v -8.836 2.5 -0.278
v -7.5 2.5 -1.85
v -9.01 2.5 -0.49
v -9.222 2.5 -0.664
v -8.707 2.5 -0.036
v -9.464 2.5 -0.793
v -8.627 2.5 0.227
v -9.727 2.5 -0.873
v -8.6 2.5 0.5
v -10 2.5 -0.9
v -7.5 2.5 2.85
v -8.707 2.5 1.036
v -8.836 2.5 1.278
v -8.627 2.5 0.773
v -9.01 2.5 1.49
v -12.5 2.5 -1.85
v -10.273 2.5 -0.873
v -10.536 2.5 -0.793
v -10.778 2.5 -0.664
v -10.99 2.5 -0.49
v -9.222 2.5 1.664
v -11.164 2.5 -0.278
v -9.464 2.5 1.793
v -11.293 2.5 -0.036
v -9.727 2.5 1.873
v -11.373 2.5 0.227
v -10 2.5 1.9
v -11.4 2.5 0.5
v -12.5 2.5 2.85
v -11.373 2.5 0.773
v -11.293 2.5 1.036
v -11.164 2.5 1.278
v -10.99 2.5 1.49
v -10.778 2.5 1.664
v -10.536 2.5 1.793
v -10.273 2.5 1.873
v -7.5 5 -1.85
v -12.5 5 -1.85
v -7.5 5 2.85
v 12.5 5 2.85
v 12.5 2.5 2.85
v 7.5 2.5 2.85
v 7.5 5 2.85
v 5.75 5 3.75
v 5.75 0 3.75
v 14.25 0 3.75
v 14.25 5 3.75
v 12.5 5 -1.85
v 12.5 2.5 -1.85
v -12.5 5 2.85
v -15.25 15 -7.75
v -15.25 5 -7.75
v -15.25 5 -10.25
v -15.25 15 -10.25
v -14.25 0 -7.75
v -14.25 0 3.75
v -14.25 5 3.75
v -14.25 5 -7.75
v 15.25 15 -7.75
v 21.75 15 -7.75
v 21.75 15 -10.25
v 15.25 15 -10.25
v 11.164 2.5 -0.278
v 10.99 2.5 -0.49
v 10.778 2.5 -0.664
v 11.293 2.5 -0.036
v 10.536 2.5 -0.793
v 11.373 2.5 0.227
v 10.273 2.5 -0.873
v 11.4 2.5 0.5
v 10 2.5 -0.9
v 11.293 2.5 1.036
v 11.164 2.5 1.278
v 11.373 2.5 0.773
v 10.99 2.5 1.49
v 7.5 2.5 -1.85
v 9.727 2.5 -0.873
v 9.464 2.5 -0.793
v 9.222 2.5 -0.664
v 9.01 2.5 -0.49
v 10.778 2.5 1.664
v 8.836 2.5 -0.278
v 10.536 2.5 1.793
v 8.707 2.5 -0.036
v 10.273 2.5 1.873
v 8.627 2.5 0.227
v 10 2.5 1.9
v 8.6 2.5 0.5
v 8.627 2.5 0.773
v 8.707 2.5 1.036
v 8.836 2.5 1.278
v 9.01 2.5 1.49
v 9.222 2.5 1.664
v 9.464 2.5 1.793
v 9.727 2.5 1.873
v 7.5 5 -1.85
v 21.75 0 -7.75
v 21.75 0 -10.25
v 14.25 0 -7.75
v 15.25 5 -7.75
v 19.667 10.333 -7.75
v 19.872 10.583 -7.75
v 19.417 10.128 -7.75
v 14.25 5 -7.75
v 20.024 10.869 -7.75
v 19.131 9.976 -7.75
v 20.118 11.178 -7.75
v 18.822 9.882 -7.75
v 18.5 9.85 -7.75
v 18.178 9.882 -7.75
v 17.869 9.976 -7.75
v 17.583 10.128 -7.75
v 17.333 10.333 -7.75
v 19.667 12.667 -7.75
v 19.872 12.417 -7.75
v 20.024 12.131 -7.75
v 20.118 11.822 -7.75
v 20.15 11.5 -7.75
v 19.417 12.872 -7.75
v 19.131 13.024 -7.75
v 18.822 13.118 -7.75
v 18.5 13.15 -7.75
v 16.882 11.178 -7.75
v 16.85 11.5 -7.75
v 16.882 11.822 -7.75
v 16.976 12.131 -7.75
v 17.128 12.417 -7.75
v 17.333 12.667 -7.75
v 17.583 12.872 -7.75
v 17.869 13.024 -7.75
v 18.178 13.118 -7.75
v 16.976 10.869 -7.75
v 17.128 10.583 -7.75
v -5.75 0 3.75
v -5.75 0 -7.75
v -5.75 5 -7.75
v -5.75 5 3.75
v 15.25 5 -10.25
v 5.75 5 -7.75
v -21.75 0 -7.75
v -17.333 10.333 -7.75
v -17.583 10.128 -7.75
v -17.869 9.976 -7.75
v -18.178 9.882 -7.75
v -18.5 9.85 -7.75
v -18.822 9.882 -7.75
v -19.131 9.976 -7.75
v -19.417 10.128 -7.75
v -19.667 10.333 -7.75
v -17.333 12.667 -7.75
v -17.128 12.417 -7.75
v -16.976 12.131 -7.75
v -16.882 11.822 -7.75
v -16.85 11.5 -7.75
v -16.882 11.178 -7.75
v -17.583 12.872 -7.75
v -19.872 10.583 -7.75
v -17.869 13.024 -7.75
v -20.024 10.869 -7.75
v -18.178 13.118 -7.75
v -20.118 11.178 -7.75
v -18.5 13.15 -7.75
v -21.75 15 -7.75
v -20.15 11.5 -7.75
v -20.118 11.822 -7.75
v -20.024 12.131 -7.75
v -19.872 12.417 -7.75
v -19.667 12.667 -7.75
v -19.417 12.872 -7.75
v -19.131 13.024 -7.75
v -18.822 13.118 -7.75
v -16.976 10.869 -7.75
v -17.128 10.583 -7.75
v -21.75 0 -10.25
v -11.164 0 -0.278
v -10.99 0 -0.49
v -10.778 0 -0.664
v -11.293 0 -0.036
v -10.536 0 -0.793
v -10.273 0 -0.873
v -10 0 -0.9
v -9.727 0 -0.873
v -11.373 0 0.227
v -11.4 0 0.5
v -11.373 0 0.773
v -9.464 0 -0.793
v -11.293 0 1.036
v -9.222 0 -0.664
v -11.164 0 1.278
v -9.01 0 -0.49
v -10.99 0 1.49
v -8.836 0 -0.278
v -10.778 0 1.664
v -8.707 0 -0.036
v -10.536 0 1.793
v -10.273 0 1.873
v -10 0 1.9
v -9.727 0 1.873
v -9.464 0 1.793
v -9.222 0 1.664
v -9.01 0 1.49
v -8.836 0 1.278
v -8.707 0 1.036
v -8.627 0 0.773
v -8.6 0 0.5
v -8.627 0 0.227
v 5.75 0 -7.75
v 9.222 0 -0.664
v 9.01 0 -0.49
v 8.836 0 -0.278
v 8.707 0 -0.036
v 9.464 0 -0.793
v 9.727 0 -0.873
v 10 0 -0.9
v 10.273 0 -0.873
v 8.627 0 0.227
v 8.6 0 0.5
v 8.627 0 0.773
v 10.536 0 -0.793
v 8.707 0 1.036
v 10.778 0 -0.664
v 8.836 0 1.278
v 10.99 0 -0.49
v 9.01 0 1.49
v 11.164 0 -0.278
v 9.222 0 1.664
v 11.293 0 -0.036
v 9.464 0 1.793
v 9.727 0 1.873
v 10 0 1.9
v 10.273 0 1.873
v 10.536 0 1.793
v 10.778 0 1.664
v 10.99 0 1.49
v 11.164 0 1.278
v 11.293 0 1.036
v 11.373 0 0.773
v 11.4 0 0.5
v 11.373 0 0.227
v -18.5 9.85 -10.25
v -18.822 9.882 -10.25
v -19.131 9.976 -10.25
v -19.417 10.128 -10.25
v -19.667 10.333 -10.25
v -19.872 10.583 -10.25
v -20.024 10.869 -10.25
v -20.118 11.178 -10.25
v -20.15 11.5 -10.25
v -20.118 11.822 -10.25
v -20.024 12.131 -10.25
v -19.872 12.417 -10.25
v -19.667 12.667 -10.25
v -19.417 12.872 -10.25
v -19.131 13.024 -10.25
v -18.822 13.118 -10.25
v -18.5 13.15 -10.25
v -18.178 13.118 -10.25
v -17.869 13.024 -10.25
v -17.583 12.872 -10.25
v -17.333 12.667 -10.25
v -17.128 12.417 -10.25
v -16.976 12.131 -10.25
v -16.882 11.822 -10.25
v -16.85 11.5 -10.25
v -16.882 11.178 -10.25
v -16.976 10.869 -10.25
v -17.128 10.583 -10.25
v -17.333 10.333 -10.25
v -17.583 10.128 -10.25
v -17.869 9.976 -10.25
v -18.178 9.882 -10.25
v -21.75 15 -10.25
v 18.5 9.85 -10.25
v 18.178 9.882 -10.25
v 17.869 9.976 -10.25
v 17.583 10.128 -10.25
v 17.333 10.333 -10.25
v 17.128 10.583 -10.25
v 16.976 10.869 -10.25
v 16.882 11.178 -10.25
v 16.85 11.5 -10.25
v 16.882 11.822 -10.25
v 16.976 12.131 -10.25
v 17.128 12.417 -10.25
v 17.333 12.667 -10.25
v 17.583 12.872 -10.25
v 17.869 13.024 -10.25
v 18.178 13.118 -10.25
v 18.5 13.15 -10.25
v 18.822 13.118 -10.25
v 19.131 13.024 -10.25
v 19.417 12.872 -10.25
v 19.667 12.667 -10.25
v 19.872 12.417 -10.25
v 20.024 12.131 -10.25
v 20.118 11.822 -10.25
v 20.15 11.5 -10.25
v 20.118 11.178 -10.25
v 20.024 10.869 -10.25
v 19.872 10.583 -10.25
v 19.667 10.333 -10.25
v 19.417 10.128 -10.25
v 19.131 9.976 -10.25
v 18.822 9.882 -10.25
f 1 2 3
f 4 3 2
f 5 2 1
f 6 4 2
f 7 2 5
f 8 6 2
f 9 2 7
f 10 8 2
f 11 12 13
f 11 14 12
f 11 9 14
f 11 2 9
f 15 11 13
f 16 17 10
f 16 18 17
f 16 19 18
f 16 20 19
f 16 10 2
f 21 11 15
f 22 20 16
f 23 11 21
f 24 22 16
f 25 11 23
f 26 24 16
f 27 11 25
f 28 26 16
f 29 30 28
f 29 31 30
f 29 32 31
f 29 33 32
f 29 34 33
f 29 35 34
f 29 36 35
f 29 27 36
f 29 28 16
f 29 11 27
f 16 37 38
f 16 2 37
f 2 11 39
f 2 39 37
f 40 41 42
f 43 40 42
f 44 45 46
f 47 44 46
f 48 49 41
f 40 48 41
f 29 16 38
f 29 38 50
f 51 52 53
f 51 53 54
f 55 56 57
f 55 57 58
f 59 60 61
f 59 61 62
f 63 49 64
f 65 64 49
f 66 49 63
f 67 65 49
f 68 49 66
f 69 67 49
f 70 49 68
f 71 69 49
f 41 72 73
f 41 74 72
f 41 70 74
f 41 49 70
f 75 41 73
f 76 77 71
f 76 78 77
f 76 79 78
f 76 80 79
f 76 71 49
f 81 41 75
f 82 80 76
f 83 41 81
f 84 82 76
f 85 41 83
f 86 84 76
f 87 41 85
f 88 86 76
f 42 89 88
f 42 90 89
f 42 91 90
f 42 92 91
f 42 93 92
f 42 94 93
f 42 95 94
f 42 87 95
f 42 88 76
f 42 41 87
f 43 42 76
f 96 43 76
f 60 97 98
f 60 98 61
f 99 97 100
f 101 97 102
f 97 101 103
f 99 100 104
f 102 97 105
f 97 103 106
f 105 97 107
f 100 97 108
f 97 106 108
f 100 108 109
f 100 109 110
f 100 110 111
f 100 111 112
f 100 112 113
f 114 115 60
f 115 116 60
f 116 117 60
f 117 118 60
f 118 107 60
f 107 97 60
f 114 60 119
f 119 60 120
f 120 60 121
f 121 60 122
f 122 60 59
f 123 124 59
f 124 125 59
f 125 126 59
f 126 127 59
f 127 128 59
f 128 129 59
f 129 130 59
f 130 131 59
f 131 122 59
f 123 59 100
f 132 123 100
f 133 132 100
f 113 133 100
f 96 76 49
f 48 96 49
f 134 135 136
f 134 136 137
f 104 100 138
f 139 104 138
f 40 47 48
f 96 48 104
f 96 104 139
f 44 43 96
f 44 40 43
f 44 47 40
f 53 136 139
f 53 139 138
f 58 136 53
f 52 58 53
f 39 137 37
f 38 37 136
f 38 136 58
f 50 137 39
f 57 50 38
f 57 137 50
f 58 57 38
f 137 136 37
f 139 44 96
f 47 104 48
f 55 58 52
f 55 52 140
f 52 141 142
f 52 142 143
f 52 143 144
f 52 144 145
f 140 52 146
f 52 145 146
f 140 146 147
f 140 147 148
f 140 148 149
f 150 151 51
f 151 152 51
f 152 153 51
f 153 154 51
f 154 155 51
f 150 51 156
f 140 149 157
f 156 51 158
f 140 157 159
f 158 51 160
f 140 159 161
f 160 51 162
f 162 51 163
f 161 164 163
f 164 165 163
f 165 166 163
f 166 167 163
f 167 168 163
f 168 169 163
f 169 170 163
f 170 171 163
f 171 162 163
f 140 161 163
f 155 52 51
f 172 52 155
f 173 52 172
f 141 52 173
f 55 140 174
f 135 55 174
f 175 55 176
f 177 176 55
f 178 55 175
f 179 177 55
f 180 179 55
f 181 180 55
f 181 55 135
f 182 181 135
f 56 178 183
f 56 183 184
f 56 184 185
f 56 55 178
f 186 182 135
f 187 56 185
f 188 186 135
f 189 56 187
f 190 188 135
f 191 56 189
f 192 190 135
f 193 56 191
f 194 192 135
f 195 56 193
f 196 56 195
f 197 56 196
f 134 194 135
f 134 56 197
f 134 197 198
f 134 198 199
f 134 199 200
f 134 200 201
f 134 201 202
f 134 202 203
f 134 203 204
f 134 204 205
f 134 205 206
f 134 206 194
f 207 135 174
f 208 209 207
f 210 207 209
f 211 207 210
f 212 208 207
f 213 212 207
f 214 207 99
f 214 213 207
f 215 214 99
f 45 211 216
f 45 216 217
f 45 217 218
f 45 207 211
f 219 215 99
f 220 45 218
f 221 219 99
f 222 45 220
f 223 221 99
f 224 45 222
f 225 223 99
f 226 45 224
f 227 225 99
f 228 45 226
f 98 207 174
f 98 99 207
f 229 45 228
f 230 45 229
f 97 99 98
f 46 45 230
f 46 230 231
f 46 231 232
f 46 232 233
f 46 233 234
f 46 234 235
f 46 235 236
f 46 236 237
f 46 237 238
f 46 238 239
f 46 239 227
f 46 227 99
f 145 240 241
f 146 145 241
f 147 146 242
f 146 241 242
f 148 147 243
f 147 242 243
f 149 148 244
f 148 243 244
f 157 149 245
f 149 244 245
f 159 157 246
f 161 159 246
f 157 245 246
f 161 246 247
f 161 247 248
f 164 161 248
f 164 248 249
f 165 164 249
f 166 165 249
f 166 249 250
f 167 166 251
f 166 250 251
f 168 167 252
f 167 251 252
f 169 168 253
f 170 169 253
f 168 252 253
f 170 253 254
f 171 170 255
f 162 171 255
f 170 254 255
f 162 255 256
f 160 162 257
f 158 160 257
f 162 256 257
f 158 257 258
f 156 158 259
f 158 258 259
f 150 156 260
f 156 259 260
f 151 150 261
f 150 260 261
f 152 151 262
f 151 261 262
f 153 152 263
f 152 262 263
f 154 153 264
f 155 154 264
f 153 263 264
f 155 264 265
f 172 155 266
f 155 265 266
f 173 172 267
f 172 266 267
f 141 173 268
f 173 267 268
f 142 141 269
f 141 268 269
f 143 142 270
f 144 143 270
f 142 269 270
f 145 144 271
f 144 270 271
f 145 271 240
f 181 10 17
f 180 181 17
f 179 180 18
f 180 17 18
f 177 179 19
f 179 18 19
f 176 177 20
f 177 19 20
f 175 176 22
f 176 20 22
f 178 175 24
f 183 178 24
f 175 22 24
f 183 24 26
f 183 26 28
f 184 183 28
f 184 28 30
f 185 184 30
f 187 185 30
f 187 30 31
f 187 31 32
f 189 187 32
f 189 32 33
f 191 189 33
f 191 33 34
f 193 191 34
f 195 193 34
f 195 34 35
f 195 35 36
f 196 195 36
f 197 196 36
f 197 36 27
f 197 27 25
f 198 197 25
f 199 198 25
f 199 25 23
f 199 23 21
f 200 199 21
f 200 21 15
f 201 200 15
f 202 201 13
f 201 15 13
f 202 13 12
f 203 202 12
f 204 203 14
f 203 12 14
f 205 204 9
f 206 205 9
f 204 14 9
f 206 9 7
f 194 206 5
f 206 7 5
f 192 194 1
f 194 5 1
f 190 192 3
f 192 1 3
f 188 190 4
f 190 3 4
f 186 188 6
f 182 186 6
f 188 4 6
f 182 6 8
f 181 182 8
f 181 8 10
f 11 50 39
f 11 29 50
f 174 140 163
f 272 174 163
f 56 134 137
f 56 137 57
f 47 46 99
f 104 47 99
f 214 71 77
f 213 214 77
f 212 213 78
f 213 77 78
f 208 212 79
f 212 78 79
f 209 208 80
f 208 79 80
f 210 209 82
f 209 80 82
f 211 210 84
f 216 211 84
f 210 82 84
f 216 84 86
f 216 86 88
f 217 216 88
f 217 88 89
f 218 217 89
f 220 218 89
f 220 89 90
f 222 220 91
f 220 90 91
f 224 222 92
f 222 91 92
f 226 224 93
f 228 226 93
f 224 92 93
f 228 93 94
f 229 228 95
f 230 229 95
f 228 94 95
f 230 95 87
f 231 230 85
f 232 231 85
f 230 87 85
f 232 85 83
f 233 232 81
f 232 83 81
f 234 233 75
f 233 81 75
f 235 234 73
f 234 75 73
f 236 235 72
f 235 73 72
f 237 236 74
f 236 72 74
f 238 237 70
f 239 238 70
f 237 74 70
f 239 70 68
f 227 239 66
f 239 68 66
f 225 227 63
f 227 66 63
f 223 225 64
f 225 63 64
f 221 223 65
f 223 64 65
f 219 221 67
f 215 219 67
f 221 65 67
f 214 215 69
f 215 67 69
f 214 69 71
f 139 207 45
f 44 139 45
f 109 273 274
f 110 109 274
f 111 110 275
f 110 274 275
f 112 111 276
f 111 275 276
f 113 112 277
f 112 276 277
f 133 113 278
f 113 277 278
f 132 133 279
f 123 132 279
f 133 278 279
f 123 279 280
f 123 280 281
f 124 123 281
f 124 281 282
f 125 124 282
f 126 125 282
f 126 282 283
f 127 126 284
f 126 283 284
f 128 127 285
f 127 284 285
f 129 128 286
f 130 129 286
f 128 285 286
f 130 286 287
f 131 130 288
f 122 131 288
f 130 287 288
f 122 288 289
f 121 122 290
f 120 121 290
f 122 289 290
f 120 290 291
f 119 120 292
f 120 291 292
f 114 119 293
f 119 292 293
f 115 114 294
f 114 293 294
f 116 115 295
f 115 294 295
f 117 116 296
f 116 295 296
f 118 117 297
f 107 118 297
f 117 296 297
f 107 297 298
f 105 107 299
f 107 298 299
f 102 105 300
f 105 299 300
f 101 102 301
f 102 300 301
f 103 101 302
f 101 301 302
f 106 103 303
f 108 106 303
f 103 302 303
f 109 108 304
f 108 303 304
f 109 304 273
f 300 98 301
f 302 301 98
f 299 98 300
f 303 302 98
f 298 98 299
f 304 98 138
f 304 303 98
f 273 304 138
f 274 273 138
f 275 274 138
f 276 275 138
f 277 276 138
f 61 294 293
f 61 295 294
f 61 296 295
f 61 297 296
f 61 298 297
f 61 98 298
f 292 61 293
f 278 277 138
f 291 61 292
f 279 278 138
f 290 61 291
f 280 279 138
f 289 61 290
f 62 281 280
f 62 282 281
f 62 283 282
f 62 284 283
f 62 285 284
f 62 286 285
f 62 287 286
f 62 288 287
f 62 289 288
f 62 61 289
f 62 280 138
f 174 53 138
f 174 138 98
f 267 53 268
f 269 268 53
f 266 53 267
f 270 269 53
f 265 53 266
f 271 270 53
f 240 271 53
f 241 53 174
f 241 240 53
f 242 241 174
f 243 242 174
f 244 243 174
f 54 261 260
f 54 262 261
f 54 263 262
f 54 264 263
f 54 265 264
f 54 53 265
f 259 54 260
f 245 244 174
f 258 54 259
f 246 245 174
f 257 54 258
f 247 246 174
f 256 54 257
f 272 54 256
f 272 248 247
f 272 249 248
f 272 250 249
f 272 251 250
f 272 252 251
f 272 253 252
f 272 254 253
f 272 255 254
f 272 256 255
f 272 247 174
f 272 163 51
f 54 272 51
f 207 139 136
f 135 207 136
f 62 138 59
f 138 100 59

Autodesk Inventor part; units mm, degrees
ref_plane "YZ Plane" through (0, 0, 0) normal (1, 0, 0) x (0, 1, 0)
ref_plane "XZ Plane" through (0, 0, 0) normal (0, 1, 0) x (-1, 0, 0)
sketch "Sketch1" plane through (0, 0, 0) normal (0, 1, 0) x (-1, 0, 0)
  line L0 (5.75, 3.75) -> (-5.75, 3.75)
  line L1 (-5.75, 3.75) -> (-5.75, -3.75)
  line L2 (-5.75, -3.75) -> (5.75, -3.75)
  line L3 (5.75, -3.75) -> (5.75, 3.75)
  line L4 (5.75, 3.75) -> (-5.75, -3.75) construction
  line L5 (-5.75, 3.75) -> (5.75, -3.75) construction
  line L6 (0, 0) -> (0, 3.75)
  circle A0 centre (10, 0.5) radius 1.25
  circle A1 centre (-10, 0.5) radius 1.25
  line L7 (8.328, 1.75) -> (12.3503, 1.75)
  line L8 (8.75, 3.0207) -> (8.75, -2.5964)
  line L9 (5.05, 3.25) -> (-5.05, 3.25)
  line L10 (-5.05, 3.25) -> (-5.05, -3.25)
  line L11 (-5.05, -3.25) -> (5.05, -3.25)
  line L12 (5.05, -3.25) -> (5.05, 3.25)
  line L13 (5.05, 3.25) -> (-5.05, -3.25) construction
  line L14 (-5.05, 3.25) -> (5.05, -3.25) construction
  dimension "d7" = 2.5
  dimension "d13" = 7.5
  dimension "d14" = 11.5
  dimension "d16" = 2
  dimension "d17" = 3
  dimension "d31" = 10.1
  dimension "d32" = 6.5
sketch "Sketch2" plane through (0, 0, 0) normal (0, 0, 1) x (1, 0, 0)
  line L0 (0, 0) -> (0, 5)
  line L1 (0, 5) -> (0, 11.5)
  line L2 (-14.9, 5) -> (14.9, 5)
  line L3 (14.9, 5) -> (14.9, 18)
  line L4 (14.9, 18) -> (-14.9, 18)
  line L5 (-14.9, 18) -> (-14.9, 5)
  line L6 (-14.9, 5) -> (14.9, 18) construction
  line L7 (14.9, 5) -> (-14.9, 18) construction
  line L8 (0, 11.5) -> (-18.5, 11.5)
  circle A0 centre (-18.5, 11.5) radius 1.6
  circle A1 centre (18.5, 11.5) radius 1.6
  dimension "d23" = 5
  dimension "d24" = 6.5
  dimension "d25" = 29.8
  dimension "d26" = 13
  dimension "d27" = 18.5
  dimension "d28" = 3.2
ref_plane "Work Plane2" through (0, 0, -6.75) normal (0, 0, 1) x (1, 0, 0)
sketch "Sketch3" plane through (0, 0, -6.75) normal (0, 0, 1) x (1, 0, 0)
  line L0 (0, 0) -> (0, 5) projected
  line L1 (-14.9, 5) -> (14.9, 5) projected
  line L2 (-14.9, 18) -> (-14.9, 5) projected
  line L3 (0, 5) -> (0, 11.5) projected
  line L4 (0, 11.5) -> (-18.5, 11.5) projected
  circle A0 centre (-18.5, 11.5) radius 1.6 projected
  line L5 (14.9, 18) -> (-14.9, 18) projected
  line L6 (14.9, 5) -> (14.9, 18) projected
  circle A1 centre (18.5, 11.5) radius 1.6 projected
sketch "Sketch4" plane through (0, 0, 0) normal (0, 1, 0) x (-1, 0, 0)
  line L0 (-14.25, -2.75) -> (-5.75, -2.75)
  line L1 (-5.75, -2.75) -> (-5.75, 3.75)
  line L2 (-5.75, 3.75) -> (-14.25, 3.75)
  line L3 (-14.25, 3.75) -> (-14.25, -2.75)
  line L4 (-14.25, -2.75) -> (-5.75, 3.75) construction
  line L5 (-5.75, -2.75) -> (-14.25, 3.75) construction
  line L6 (0, 0) -> (0, 3.75) projected
  line L7 (14.25, -2.75) -> (5.75, -2.75)
  line L8 (5.75, -2.75) -> (5.75, 3.75)
  line L9 (5.75, 3.75) -> (14.25, 3.75)
  line L10 (14.25, 3.75) -> (14.25, -2.75)
  point P0 (-10, 0.5)
  point P1 (-10, 0.5)
  point P2 (-10, 0.5)
  point P3 (10, 0.5)
  point P4 (10, 0.5)
extrude "Extrusion1" add sketch "Sketch4" along normal blind 2.5 contours L3 L2 L1 L0
extrude "Extrusion2" add sketch "Sketch4" along normal blind 2.5 contours L7 L8 L9 L10
hole "Hole1" at (10, 0, 0.5) at (-10, 0, 0.5) direction (0, 1, 0) diameter 2.8 end through all
sketch "Sketch5" plane through (0, 2.5, 0) normal (0, 1, 0) x (1, 0, 0)
  line L0 (5.75, -3.75) -> (5.75, 2.75) projected
  line L1 (5.75, 2.75) -> (14.25, 2.75) projected
  line L2 (14.25, 2.75) -> (14.25, -3.75) projected
  line L3 (14.25, -3.75) -> (5.75, -3.75) projected
  line L4 (7.5, 1.85) -> (12.5, 1.85)
  line L5 (12.5, 1.85) -> (12.5, -2.85)
  line L6 (12.5, -2.85) -> (7.5, -2.85)
  line L7 (7.5, -2.85) -> (7.5, 1.85)
  line L8 (0, 0) -> (0, -3.75) projected
  line L9 (-5.75, -3.75) -> (-5.75, 2.75)
  line L10 (-5.75, 2.75) -> (-14.25, 2.75)
  line L11 (-14.25, 2.75) -> (-14.25, -3.75)
  line L12 (-14.25, -3.75) -> (-5.75, -3.75)
  line L13 (-7.5, 1.85) -> (-12.5, 1.85)
  line L14 (-12.5, 1.85) -> (-12.5, -2.85)
  line L15 (-12.5, -2.85) -> (-7.5, -2.85)
  line L16 (-7.5, -2.85) -> (-7.5, 1.85)
  dimension "d69" = 1.75
  dimension "d70" = 0.9
  dimension "d71" = 1.75
  dimension "d72" = 0.9
extrude "Extrusion8" add sketch "Sketch5" along normal blind 2.5
sketch "Sketch8" plane through (14.25, 0, -2.75) normal (0, 0, -1) x (-1, 0, 0)
  line L0 (14.25, 0) -> (14.25, 5) projected
  line L1 (8.5, 0) -> (8.5, 5) projected
  line L2 (0, 5) -> (8.5, 5)
  line L3 (8.5, 5) -> (8.5, 0)
  line L4 (8.5, 0) -> (0, 0)
  line L5 (0, 0) -> (0, 5)
  line L6 (20, 0) -> (20, 5)
  line L7 (28.5, 5) -> (20, 5)
  line L8 (20, 5) -> (20, 0)
  line L9 (20, 0) -> (28.5, 0)
  line L10 (28.5, 0) -> (28.5, 5)
extrude "Extrusion9" add sketch "Sketch8" along normal blind 5
sketch "Sketch10" plane through (14.25, 0, -7.75) normal (0, 0, -1) x (-1, 0, 0)
  line L0 (14.25, 0) -> (14.25, 5) projected
  line L1 (8.5, 0) -> (-7.5, 0)
  line L2 (8.5, 0) -> (24.5, 0) construction
  line L3 (-7.5, 0) -> (-7.5, 15)
  line L4 (-7.5, 15) -> (-1, 15)
  line L5 (8.5, 0) -> (8.5, 5)
  line L6 (8.5, 5) -> (-1, 5)
  line L7 (-1, 5) -> (-1, 15)
  line L8 (20, 0) -> (36, 0)
  line L9 (36, 0) -> (36, 15)
  line L10 (36, 15) -> (29.5, 15)
  line L11 (20, 0) -> (20, 5)
  line L12 (20, 5) -> (29.5, 5)
  line L13 (29.5, 5) -> (29.5, 15)
  line L14 (8.5, 5) -> (20, 5)
  line L15 (20, 0) -> (8.5, 0)
  point P0 (-4.25, 11.5)
  point P1 (-4.25, 11.5)
  point P2 (32.75, 11.5)
  point P3 (32.75, 11.5)
  dimension "d95" = 16
  dimension "d97" = 15
  dimension "d98" = 6.5
  dimension "d99" = 5
extrude "Extrusion10" add sketch "Sketch10" along normal blind 2.5
hole "Hole2" at (18.5, 11.5, -7.75) at (-18.5, 11.5, -7.75) direction (0, 0, -1) diameter 3.3 end through all
